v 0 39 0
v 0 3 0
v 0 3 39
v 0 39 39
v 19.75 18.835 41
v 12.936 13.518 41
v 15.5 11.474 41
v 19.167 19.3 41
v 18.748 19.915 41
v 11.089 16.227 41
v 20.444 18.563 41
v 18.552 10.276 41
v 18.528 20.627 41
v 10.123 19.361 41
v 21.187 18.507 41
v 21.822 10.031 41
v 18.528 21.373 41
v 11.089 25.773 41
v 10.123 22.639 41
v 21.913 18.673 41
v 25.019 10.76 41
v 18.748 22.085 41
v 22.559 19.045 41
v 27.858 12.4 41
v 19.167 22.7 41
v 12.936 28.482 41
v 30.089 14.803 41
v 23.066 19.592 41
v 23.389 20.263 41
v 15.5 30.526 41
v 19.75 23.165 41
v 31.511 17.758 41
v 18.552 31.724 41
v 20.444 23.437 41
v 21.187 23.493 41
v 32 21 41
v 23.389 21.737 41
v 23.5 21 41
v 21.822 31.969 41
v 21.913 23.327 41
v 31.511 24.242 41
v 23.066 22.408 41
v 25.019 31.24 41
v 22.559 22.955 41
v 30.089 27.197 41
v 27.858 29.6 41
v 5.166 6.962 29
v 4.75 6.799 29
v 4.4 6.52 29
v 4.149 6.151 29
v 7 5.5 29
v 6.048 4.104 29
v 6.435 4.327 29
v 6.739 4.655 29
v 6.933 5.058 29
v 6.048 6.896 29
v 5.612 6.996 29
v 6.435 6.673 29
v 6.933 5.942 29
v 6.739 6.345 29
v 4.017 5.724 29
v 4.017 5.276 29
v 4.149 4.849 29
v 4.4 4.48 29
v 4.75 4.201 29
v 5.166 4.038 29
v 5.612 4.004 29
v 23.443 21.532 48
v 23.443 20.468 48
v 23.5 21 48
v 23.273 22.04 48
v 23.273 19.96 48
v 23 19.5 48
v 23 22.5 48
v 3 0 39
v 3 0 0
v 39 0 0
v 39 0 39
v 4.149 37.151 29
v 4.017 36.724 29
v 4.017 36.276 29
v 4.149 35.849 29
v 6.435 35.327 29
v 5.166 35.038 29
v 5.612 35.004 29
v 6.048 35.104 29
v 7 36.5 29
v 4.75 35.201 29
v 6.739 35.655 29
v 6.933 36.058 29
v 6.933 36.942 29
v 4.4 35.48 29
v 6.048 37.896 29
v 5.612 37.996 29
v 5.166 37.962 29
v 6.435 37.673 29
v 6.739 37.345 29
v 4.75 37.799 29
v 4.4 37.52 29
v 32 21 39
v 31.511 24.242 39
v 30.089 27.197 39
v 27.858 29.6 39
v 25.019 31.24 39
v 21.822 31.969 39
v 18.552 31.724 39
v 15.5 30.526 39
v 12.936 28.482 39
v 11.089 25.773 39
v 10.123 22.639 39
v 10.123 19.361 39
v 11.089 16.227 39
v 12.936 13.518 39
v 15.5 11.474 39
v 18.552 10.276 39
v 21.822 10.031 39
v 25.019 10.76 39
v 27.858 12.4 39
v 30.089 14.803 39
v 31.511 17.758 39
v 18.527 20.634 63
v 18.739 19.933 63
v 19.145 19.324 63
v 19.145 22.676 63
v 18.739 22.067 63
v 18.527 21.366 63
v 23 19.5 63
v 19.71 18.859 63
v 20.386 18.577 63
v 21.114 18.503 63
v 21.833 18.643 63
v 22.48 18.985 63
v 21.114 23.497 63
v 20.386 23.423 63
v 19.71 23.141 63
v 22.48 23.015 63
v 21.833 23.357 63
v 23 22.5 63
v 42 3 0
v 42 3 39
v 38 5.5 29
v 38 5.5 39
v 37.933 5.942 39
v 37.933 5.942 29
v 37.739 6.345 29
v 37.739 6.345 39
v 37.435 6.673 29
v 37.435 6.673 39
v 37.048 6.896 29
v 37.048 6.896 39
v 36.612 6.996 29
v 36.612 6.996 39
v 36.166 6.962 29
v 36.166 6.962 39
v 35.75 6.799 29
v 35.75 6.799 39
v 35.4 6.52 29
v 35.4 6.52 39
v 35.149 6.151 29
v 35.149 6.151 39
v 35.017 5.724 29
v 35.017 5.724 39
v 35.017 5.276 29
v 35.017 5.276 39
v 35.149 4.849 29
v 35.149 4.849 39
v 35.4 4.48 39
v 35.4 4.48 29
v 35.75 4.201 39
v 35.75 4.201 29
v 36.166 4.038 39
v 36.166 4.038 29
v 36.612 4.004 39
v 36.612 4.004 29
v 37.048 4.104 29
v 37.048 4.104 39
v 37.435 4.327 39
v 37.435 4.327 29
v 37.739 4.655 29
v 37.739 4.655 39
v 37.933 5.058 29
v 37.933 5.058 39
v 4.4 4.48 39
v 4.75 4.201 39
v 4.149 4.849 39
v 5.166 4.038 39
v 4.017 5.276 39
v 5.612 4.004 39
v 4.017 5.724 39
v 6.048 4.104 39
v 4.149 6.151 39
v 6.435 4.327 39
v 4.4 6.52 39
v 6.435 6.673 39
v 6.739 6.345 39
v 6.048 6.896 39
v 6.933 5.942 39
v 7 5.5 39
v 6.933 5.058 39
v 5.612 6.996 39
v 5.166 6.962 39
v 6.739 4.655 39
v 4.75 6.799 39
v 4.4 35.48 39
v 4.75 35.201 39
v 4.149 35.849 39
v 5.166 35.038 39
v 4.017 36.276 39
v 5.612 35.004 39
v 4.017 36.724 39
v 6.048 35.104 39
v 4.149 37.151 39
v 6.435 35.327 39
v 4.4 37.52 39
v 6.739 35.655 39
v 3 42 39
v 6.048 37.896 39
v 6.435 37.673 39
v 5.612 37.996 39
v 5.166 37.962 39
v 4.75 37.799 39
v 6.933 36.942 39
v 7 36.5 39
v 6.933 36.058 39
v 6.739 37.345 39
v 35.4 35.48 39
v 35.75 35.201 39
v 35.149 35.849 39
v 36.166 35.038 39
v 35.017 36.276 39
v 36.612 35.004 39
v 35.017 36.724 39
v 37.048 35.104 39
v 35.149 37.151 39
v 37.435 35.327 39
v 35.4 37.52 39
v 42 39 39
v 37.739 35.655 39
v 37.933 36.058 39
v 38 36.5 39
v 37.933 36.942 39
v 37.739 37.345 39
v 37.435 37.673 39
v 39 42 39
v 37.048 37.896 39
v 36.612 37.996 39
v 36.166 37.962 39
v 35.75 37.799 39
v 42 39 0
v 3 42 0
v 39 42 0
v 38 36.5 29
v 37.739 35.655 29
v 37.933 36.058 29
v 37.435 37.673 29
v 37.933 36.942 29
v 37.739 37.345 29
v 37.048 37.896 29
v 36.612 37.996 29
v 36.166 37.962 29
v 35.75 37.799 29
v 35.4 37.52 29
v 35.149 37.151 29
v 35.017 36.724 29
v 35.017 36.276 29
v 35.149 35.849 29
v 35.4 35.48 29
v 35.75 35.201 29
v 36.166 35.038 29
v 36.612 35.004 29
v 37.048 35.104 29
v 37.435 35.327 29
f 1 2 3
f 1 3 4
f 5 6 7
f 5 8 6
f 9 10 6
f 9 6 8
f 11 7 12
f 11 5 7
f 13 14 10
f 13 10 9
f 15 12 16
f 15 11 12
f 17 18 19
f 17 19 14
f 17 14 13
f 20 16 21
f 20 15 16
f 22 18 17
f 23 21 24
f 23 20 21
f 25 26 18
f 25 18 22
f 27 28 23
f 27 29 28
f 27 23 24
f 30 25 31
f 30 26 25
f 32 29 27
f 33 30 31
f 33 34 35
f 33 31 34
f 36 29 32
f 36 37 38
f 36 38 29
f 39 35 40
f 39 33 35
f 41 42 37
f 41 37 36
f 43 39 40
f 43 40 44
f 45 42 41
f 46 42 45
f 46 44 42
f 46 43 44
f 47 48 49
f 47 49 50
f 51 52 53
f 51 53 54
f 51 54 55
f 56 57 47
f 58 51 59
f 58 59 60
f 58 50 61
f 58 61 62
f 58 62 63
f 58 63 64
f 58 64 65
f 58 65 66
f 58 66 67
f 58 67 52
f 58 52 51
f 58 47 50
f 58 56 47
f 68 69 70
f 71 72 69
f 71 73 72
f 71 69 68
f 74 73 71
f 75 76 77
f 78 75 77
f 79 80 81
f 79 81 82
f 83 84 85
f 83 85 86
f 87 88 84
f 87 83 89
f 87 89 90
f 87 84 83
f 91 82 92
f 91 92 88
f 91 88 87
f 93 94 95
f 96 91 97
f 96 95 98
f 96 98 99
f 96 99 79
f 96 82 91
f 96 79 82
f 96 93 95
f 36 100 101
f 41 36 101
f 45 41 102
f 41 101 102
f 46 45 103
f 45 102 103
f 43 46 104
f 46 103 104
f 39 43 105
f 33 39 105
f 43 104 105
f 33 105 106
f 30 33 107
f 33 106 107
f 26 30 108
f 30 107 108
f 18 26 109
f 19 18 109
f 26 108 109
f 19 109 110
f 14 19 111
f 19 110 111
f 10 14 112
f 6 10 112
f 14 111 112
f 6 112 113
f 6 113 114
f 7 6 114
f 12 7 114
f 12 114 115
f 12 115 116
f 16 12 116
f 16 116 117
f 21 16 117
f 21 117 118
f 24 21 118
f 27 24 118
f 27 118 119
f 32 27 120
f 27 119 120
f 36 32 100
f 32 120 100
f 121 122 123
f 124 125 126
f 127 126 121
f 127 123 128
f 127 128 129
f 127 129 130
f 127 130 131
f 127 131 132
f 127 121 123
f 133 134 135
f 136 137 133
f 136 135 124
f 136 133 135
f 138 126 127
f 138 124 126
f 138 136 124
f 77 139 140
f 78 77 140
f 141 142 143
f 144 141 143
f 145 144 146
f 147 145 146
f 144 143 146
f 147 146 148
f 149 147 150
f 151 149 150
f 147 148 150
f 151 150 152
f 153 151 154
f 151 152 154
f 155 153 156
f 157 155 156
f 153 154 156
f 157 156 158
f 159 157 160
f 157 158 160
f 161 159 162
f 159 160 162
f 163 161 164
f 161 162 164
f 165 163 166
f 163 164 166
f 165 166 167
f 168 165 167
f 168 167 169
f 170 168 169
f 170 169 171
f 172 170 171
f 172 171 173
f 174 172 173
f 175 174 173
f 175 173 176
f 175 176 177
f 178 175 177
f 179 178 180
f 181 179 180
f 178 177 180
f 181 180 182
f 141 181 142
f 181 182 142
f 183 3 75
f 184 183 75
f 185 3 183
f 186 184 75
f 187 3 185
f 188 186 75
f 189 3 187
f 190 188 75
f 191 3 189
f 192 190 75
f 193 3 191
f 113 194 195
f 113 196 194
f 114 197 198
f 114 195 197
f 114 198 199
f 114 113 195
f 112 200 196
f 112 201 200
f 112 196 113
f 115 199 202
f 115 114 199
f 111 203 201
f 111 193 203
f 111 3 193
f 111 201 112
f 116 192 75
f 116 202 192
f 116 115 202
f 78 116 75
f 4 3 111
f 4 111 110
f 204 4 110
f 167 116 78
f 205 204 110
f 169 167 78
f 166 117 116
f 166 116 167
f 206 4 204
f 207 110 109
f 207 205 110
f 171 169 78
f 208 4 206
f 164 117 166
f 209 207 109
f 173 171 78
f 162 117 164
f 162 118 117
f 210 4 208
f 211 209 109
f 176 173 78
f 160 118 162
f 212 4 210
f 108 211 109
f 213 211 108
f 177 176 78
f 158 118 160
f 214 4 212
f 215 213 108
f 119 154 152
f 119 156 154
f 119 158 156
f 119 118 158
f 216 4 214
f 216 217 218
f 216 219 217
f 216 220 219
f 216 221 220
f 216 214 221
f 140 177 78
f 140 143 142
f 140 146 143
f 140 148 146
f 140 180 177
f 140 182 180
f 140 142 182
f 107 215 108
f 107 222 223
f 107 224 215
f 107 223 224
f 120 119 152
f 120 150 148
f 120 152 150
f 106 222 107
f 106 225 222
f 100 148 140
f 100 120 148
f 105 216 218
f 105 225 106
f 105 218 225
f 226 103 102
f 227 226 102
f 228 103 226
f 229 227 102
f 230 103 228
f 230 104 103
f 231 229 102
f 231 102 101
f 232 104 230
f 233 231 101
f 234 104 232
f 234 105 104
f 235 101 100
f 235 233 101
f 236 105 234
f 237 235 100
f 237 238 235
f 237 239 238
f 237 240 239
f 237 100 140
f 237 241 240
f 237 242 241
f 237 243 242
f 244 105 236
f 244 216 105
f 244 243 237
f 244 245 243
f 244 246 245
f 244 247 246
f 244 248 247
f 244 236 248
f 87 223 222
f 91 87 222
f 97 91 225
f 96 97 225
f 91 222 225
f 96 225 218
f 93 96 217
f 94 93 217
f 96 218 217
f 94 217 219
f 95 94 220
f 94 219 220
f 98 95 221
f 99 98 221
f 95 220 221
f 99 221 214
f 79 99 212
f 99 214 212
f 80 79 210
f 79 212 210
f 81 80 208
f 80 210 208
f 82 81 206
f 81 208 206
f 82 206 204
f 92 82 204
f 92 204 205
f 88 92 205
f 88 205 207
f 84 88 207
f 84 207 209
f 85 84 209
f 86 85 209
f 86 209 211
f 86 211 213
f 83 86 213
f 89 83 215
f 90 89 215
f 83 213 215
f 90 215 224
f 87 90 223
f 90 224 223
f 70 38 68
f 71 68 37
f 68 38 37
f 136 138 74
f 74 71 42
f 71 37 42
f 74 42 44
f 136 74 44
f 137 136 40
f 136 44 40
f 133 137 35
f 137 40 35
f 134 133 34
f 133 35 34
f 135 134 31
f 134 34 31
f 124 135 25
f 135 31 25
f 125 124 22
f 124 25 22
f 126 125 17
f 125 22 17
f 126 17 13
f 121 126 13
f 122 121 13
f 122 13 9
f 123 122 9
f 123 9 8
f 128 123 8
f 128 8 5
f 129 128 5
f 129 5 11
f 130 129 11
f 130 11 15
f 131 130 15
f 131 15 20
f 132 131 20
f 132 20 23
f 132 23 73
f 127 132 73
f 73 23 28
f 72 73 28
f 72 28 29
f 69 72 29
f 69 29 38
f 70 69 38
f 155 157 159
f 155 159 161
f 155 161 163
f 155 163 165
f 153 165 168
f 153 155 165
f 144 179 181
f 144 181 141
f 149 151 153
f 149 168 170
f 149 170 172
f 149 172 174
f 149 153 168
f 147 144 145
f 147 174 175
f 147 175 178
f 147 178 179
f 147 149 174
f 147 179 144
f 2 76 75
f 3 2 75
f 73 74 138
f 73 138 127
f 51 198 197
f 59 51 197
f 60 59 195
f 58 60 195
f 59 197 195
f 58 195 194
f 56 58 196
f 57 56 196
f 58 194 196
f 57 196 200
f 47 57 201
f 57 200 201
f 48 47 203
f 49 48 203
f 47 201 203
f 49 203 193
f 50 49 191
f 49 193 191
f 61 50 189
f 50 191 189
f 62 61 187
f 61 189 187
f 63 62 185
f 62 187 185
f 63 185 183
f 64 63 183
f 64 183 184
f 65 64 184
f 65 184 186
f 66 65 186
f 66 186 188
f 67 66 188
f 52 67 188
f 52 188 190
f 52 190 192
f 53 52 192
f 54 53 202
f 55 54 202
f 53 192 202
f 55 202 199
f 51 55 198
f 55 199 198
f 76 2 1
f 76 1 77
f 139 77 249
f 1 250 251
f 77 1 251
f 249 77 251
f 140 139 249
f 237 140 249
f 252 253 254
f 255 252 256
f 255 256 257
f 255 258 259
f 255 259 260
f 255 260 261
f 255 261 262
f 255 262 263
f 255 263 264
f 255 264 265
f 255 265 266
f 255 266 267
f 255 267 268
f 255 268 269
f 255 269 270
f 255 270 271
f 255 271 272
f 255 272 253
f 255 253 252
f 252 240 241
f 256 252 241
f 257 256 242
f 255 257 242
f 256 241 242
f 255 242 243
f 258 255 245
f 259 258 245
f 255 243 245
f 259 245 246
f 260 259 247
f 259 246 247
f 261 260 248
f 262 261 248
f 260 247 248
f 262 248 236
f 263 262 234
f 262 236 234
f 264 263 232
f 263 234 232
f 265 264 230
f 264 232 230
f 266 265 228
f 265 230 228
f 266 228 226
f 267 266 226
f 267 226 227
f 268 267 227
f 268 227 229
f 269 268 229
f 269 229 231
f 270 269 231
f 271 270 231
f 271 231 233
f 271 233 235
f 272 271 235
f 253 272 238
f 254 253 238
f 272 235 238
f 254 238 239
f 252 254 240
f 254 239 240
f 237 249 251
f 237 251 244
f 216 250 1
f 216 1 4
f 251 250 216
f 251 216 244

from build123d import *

# Parameters (mm, degrees)
SKETCH1_W               = 42
SKETCH1_H               = 42
BOSS_EXTRUDE1_DEPTH     = 39
SKETCH2_R               = 11
BOSS_EXTRUDE2_DEPTH     = 2
SKETCH3_R               = 2.5
BOSS_EXTRUDE3_DEPTH     = 22
CHAMFER1_SIZE           = 3
SKETCH4_R               = 1.5
CUT_EXTRUDE1_DEPTH      = 10
CUT_EXTRUDE2_DEPTH      = 87.585218138
CUT_EXTRUDE2_DEPTH_BACK = 15


with BuildPart() as part:
    # Sketch1 → Boss-Extrude1 (new body)
    with BuildSketch(Plane.XY):
        with Locations((21, 21)):
            Rectangle(SKETCH1_W, SKETCH1_H)
    extrude(amount=BOSS_EXTRUDE1_DEPTH)

    # Sketch2 → Boss-Extrude2 (add)
    with BuildSketch(Plane.XY.offset(39)):
        with Locations((21, 21)):
            Circle(SKETCH2_R)
    extrude(amount=BOSS_EXTRUDE2_DEPTH)

    # Sketch3 → Boss-Extrude3 (add)
    with BuildSketch(Plane.XY.offset(41)):
        with Locations((21, 21)):
            Circle(SKETCH3_R)
    extrude(amount=BOSS_EXTRUDE3_DEPTH)

    # Chamfer1
    chamfer1_edges = [part.edges().sort_by_distance(p)[0] for p in [
        (0, 42, 19.5),
        (42, 42, 19.5),
        (42, 0, 19.5),
        (0, 0, 19.5),
    ]]
    chamfer(chamfer1_edges, length=CHAMFER1_SIZE)

    # Sketch4 → Cut-Extrude1 (cut)
    with BuildSketch(Plane.XY.offset(39)):
        with Locations((5.5, 36.5)):
            Circle(SKETCH4_R)
        with Locations((5.5, 5.5)):
            Circle(SKETCH4_R)
        with Locations((36.5, 5.5)):
            Circle(SKETCH4_R)
        with Locations((36.5, 36.5)):
            Circle(SKETCH4_R)
    extrude(amount=-CUT_EXTRUDE1_DEPTH, mode=Mode.SUBTRACT)

    # Sketch5 → Cut-Extrude2 (cut, two sides: drawn at the far end of the back side and taken through both)
    with BuildSketch(Plane.XY.offset(63).offset(-CUT_EXTRUDE2_DEPTH_BACK)):
        Polygon((23, 96.850602173), (23, 22.5), (23, 19.5), (23, -54.850602173), (171.701204346, -54.850602173), (171.701204346, 96.850602173), align=None)
    extrude(amount=CUT_EXTRUDE2_DEPTH + CUT_EXTRUDE2_DEPTH_BACK, mode=Mode.SUBTRACT)


solid = part.part
